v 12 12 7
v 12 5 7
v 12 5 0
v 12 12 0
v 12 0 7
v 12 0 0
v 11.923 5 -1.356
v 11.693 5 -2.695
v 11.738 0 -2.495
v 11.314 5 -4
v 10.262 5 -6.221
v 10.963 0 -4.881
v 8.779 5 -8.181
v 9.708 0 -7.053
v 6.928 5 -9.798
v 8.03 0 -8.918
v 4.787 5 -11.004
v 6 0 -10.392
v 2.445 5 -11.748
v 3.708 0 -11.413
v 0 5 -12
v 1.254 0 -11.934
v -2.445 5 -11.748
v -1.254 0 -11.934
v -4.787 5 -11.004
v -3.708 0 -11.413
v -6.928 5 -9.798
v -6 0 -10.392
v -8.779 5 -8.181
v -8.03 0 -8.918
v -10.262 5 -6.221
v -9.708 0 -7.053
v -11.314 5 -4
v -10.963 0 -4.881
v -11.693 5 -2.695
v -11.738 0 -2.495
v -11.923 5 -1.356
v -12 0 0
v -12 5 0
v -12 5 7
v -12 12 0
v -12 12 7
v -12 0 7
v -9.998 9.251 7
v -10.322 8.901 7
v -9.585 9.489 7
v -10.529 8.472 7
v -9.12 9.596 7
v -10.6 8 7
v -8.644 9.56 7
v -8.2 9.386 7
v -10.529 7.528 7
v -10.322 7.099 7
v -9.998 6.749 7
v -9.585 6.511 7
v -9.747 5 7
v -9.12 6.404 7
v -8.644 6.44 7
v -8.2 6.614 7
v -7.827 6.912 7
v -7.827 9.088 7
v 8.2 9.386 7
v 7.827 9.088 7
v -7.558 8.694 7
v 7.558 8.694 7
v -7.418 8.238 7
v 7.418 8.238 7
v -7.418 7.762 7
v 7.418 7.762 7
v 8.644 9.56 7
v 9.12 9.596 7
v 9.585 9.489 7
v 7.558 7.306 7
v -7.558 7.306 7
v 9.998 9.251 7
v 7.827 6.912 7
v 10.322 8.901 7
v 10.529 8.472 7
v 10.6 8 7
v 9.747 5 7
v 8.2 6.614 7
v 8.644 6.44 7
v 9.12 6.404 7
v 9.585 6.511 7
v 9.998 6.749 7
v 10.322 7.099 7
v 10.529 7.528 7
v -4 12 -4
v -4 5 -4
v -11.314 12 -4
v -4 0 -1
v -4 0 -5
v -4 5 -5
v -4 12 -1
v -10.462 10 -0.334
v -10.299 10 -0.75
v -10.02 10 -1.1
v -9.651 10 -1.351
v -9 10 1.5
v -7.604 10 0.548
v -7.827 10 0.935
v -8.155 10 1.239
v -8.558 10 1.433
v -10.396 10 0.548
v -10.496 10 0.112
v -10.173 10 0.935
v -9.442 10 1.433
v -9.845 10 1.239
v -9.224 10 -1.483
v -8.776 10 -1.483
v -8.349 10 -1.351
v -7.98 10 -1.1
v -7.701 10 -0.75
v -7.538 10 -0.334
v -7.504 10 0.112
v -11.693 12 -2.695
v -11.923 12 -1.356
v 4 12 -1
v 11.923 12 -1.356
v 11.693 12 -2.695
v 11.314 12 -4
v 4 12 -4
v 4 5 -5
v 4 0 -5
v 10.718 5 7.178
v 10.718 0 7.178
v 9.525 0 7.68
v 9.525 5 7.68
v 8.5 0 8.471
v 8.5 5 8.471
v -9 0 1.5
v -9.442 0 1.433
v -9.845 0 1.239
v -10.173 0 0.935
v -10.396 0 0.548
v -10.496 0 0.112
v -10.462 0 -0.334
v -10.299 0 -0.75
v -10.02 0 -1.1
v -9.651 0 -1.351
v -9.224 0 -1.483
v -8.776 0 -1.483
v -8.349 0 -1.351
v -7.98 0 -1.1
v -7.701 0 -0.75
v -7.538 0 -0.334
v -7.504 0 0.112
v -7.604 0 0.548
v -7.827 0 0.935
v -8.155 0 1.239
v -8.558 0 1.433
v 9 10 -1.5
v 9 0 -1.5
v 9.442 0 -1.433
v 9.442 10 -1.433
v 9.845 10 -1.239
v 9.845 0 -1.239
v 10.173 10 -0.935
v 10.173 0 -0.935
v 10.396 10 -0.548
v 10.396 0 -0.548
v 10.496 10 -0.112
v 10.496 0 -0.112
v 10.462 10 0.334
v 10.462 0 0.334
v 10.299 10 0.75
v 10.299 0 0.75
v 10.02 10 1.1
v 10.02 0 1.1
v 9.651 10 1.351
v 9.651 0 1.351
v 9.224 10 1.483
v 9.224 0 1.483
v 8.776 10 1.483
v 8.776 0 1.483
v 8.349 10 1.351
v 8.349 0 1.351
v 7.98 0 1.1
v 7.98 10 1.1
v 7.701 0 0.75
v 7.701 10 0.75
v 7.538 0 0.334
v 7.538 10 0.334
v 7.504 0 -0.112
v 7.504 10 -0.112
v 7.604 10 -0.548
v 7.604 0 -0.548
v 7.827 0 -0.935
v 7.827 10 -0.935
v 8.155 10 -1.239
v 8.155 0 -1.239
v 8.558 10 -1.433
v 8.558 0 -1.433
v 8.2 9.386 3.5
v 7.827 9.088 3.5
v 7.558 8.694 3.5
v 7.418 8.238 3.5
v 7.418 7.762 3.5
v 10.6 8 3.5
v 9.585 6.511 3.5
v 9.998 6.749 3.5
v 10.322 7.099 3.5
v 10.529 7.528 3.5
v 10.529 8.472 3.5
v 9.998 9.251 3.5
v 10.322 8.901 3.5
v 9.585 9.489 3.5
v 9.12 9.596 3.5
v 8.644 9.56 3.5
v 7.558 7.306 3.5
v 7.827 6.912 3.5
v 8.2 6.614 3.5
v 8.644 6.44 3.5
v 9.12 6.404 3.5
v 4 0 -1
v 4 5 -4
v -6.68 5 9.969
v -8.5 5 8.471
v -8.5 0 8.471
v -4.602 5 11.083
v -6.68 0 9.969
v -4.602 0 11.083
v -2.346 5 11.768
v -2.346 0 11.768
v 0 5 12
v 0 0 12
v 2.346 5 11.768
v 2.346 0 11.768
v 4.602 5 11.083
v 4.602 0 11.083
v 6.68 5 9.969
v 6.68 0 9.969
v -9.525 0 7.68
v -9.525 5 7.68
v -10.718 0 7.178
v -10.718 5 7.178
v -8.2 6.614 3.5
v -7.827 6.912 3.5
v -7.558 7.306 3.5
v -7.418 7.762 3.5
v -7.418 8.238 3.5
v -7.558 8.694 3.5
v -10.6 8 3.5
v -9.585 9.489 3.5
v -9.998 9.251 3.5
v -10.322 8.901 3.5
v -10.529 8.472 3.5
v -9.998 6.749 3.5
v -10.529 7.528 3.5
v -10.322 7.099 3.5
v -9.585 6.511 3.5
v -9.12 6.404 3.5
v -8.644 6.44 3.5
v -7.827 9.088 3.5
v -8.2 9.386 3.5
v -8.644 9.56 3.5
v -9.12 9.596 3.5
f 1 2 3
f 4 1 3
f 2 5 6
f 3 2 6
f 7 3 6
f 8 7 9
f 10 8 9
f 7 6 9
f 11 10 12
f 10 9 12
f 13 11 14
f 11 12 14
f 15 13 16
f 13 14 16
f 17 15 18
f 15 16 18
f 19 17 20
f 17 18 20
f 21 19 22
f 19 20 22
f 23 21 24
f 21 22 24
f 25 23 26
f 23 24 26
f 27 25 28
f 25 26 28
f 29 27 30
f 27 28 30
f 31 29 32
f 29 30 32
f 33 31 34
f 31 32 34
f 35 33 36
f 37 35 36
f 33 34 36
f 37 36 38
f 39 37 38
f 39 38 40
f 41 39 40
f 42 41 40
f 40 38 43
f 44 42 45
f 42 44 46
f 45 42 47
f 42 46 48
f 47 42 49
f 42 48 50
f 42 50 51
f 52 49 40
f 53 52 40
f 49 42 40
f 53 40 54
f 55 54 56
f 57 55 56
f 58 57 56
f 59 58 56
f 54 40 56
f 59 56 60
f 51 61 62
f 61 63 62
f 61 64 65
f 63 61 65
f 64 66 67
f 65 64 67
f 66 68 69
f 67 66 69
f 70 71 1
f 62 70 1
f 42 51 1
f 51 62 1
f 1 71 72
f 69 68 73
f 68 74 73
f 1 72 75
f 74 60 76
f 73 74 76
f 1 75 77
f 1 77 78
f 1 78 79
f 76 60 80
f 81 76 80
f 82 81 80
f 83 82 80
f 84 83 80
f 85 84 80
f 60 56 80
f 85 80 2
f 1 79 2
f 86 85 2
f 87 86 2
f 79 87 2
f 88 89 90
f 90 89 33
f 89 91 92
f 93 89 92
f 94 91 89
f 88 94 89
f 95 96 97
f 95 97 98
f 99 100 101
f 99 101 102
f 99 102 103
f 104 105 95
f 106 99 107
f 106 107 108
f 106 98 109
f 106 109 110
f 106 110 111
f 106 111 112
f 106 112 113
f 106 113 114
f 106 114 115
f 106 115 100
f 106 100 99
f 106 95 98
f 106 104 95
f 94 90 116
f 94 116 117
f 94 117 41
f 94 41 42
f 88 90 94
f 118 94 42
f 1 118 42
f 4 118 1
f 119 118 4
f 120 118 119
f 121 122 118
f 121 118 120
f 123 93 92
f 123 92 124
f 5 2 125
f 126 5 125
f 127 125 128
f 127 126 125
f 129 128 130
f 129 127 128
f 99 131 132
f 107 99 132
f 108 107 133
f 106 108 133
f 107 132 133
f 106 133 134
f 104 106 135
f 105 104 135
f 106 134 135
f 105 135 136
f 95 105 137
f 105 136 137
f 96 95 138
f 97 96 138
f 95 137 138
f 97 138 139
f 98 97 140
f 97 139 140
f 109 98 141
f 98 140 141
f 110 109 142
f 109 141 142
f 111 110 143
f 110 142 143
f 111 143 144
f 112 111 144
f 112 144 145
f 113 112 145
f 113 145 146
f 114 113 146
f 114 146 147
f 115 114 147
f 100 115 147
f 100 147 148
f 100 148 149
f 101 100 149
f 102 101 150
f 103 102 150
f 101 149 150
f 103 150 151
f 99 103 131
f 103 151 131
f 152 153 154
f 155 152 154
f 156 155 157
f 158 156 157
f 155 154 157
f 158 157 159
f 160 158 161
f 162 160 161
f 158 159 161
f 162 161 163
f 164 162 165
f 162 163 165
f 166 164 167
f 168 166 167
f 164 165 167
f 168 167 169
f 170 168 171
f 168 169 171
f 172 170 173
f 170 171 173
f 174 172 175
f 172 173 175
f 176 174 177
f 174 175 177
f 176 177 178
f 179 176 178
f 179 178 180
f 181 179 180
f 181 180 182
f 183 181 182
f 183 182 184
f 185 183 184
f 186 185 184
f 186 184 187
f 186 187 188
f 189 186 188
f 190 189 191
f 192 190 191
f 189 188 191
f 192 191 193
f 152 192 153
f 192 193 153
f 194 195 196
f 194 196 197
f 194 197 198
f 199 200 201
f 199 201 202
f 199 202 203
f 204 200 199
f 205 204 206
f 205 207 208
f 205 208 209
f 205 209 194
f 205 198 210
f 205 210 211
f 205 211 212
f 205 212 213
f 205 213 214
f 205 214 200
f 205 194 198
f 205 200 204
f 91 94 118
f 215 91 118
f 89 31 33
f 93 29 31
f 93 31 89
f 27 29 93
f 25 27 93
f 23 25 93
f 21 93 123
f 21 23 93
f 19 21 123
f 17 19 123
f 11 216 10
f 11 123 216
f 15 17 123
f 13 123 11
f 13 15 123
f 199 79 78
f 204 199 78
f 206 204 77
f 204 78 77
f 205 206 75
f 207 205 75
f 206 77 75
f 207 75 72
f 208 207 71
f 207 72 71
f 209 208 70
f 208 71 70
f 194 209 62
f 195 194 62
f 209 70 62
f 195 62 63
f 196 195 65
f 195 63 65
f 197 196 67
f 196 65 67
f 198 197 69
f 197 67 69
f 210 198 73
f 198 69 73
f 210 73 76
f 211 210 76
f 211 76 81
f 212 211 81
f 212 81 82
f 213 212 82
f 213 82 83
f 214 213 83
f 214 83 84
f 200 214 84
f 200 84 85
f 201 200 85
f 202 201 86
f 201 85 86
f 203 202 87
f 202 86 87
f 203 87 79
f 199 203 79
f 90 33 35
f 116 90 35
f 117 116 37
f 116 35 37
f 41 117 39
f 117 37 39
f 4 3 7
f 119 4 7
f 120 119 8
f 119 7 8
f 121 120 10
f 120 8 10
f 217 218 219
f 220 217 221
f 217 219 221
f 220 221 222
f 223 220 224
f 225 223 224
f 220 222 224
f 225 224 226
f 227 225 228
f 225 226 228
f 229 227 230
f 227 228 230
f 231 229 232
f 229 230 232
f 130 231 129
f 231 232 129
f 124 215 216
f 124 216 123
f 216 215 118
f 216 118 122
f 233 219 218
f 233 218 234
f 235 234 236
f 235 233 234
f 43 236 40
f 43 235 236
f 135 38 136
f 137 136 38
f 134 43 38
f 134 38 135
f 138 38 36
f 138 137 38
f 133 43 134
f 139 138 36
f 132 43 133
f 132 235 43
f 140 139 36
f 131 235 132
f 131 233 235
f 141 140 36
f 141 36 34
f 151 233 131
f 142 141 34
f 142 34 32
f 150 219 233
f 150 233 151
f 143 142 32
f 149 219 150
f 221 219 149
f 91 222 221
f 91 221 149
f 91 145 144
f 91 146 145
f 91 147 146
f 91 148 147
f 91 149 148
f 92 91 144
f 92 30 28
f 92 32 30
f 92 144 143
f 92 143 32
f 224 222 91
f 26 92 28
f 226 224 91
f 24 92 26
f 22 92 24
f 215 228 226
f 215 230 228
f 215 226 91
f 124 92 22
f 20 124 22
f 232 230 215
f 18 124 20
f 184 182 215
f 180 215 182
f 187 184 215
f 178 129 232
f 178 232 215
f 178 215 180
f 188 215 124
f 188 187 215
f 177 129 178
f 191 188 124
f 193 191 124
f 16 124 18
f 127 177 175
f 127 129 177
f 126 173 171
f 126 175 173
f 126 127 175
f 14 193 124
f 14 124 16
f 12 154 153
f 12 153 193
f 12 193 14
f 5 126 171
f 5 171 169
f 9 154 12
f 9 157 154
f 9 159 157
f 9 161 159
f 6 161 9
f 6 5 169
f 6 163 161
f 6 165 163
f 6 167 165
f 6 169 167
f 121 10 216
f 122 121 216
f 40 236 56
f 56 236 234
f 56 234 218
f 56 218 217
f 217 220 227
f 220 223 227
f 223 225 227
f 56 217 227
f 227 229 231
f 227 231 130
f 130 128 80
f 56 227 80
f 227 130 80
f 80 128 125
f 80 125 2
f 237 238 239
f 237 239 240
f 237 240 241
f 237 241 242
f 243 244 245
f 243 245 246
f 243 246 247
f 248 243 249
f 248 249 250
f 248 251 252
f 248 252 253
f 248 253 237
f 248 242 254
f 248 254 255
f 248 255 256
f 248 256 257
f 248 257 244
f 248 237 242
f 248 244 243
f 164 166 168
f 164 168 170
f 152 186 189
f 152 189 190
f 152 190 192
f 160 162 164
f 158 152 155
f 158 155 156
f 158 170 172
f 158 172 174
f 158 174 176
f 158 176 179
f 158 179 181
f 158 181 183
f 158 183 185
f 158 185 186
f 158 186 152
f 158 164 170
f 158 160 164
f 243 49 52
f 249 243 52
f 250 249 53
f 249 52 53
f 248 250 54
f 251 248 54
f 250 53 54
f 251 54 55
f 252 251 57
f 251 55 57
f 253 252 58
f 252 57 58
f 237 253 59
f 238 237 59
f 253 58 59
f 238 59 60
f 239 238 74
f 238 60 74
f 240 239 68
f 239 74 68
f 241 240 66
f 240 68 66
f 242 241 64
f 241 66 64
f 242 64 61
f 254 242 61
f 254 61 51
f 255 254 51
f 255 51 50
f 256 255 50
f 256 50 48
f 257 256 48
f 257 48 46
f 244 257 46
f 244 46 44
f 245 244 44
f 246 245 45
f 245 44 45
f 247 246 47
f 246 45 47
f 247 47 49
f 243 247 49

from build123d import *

# Parameters (mm, degrees)
EXTRUDE_1_DEPTH     = 5
EXTRUDE_2_DEPTH     = 7
SKETCH_3_R          = 1.5
CUT_EXTRUDE_1_DEPTH = 10
SKETCH_4_R          = 1.6
CUT_EXTRUDE_2_DEPTH = 3.5
SKETCH_5_W          = 8
SKETCH_5_H          = 4
CUT_EXTRUDE_4_DEPTH = 21.784609691
FILLET_1_R          = 5


with BuildPart() as part:
    # 草图1 → 凸台-拉伸1 (new body)
    with BuildSketch(Plane(origin=(0, 0, 0), x_dir=(1, 0, 0), z_dir=(0, 1, 0))):
        with BuildLine():
            ThreePointArc((12, 0), (0, 12), (-12, 0))
            Line((-12, 0), (12, 0))
        make_face()
        with BuildLine():
            ThreePointArc((-12, 0), (-11.422817781, -3.676851089), (-9.746794345, -7))
            Line((-9.746794345, -7), (9.746794345, -7))
            ThreePointArc((9.746794345, -7), (11.422817781, -3.676851089), (12, 0))
            Line((12, 0), (-12, 0))
        make_face()
        with BuildLine():
            Line((-12, 0), (-12, -7))
            Line((-12, -7), (-9.746794345, -7))
            ThreePointArc((-9.746794345, -7), (-11.422817781, -3.676851089), (-12, 0))
        make_face()
        with BuildLine():
            Line((9.746794345, -7), (-9.746794345, -7))
            ThreePointArc((-9.746794345, -7), (0, -12), (9.746794345, -7))
        make_face()
        with BuildLine():
            ThreePointArc((12, 0), (11.422817781, -3.676851089), (9.746794345, -7))
            Line((9.746794345, -7), (12, -7))
            Line((12, -7), (12, 0))
        make_face()
    extrude(amount=EXTRUDE_1_DEPTH)

    # 草图2 → 凸台-拉伸2 (add)
    with BuildSketch(Plane(origin=(0, 5, 0), x_dir=(1, 0, 0), z_dir=(0, 1, 0))):
        with BuildLine():
            Line((-12, 0), (-12, -7))
            Line((-12, -7), (-9.746794345, -7))
            Line((-9.746794345, -7), (9.746794345, -7))
            Line((9.746794345, -7), (12, -7))
            Line((12, -7), (12, 0))
            ThreePointArc((12, 0), (11.827182716, 2.029223745), (11.313708499, 4))
            Line((11.313708499, 4), (-11.313708499, 4))
            ThreePointArc((-11.313708499, 4), (-11.827182716, 2.029223745), (-12, 0))
        make_face()
    extrude(amount=EXTRUDE_2_DEPTH)

    # 草图3 → 切除-拉伸1 (cut)
    with BuildSketch(Plane.XZ):
        with Locations(Location((9, 0, 0), (0, 0, 270))):
            Circle(SKETCH_3_R)
        with Locations(Location((-9, 0, 0), (0, 0, 90))):
            Circle(SKETCH_3_R)
    extrude(amount=-CUT_EXTRUDE_1_DEPTH, mode=Mode.SUBTRACT)

    # 草图4 → 切除-拉伸2 (cut)
    with BuildSketch(Plane.XY.offset(7)):
        with Locations((9, 8)):
            Circle(SKETCH_4_R)
        with Locations(Location((-9, 8, 0), (0, 0, 180))):
            Circle(SKETCH_4_R)
    extrude(amount=-CUT_EXTRUDE_2_DEPTH, mode=Mode.SUBTRACT)

    # 草图5 → 切除-拉伸4 (cut, through all)
    with BuildSketch(Plane(origin=(0, 12, 0), x_dir=(1, 0, 0), z_dir=(0, 1, 0))):
        with Locations((0, 3)):
            Rectangle(SKETCH_5_W, SKETCH_5_H)
    extrude(amount=-CUT_EXTRUDE_4_DEPTH, mode=Mode.SUBTRACT)

    # 圆角1
    # the kernel refuses this fillet: 5 mm, written as the material it adds along each edge
    with BuildSketch(Plane(origin=(-9.746794345, 0, 7), x_dir=(0.6466979741325999, 0, 0.7627461768195178), z_dir=(0, 1, 0))) as fillet_1_piece_1_section:
        with BuildLine():
            CenterArc((2.329688222, -4.983839976), FILLET_1_R, 94.607768722, 45.099127844)
            Line((-1.484042662, -1.750350105), (0, 0))
            ThreePointArc((0, 0), (0.964008919, -0.038784058), (1.928017839, 0))
        make_face()
    fillet_1_piece_1 = extrude(amount=5, mode=Mode.PRIVATE)
    fillet_1_piece_1 = split(fillet_1_piece_1, bisect_by=Plane(origin=(-12, 2.5, 7.309223298), z_dir=(1, 0, 0)), keep=Keep.TOP, mode=Mode.PRIVATE)
    add(fillet_1_piece_1)
    with BuildSketch(Plane(origin=(9.746794345, 0, 7), x_dir=(-0.6466979741326015, 0, 0.7627461768195165), z_dir=(0, 1, 0))) as fillet_1_piece_2_section:
        with BuildLine():
            CenterArc((2.329688222, 4.983839976), FILLET_1_R, 220.293103434, 45.099127844)
            Line((-1.484042662, 1.750350105), (0, 0))
            ThreePointArc((0, 0), (0.964008919, 0.038784058), (1.928017839, 0))
        make_face()
    fillet_1_piece_2 = extrude(amount=5, mode=Mode.PRIVATE)
    fillet_1_piece_2 = split(fillet_1_piece_2, bisect_by=Plane(origin=(12, 2.5, 7.309223298), z_dir=(-1, 0, 0)), keep=Keep.TOP, mode=Mode.PRIVATE)
    add(fillet_1_piece_2)


solid = part.part
